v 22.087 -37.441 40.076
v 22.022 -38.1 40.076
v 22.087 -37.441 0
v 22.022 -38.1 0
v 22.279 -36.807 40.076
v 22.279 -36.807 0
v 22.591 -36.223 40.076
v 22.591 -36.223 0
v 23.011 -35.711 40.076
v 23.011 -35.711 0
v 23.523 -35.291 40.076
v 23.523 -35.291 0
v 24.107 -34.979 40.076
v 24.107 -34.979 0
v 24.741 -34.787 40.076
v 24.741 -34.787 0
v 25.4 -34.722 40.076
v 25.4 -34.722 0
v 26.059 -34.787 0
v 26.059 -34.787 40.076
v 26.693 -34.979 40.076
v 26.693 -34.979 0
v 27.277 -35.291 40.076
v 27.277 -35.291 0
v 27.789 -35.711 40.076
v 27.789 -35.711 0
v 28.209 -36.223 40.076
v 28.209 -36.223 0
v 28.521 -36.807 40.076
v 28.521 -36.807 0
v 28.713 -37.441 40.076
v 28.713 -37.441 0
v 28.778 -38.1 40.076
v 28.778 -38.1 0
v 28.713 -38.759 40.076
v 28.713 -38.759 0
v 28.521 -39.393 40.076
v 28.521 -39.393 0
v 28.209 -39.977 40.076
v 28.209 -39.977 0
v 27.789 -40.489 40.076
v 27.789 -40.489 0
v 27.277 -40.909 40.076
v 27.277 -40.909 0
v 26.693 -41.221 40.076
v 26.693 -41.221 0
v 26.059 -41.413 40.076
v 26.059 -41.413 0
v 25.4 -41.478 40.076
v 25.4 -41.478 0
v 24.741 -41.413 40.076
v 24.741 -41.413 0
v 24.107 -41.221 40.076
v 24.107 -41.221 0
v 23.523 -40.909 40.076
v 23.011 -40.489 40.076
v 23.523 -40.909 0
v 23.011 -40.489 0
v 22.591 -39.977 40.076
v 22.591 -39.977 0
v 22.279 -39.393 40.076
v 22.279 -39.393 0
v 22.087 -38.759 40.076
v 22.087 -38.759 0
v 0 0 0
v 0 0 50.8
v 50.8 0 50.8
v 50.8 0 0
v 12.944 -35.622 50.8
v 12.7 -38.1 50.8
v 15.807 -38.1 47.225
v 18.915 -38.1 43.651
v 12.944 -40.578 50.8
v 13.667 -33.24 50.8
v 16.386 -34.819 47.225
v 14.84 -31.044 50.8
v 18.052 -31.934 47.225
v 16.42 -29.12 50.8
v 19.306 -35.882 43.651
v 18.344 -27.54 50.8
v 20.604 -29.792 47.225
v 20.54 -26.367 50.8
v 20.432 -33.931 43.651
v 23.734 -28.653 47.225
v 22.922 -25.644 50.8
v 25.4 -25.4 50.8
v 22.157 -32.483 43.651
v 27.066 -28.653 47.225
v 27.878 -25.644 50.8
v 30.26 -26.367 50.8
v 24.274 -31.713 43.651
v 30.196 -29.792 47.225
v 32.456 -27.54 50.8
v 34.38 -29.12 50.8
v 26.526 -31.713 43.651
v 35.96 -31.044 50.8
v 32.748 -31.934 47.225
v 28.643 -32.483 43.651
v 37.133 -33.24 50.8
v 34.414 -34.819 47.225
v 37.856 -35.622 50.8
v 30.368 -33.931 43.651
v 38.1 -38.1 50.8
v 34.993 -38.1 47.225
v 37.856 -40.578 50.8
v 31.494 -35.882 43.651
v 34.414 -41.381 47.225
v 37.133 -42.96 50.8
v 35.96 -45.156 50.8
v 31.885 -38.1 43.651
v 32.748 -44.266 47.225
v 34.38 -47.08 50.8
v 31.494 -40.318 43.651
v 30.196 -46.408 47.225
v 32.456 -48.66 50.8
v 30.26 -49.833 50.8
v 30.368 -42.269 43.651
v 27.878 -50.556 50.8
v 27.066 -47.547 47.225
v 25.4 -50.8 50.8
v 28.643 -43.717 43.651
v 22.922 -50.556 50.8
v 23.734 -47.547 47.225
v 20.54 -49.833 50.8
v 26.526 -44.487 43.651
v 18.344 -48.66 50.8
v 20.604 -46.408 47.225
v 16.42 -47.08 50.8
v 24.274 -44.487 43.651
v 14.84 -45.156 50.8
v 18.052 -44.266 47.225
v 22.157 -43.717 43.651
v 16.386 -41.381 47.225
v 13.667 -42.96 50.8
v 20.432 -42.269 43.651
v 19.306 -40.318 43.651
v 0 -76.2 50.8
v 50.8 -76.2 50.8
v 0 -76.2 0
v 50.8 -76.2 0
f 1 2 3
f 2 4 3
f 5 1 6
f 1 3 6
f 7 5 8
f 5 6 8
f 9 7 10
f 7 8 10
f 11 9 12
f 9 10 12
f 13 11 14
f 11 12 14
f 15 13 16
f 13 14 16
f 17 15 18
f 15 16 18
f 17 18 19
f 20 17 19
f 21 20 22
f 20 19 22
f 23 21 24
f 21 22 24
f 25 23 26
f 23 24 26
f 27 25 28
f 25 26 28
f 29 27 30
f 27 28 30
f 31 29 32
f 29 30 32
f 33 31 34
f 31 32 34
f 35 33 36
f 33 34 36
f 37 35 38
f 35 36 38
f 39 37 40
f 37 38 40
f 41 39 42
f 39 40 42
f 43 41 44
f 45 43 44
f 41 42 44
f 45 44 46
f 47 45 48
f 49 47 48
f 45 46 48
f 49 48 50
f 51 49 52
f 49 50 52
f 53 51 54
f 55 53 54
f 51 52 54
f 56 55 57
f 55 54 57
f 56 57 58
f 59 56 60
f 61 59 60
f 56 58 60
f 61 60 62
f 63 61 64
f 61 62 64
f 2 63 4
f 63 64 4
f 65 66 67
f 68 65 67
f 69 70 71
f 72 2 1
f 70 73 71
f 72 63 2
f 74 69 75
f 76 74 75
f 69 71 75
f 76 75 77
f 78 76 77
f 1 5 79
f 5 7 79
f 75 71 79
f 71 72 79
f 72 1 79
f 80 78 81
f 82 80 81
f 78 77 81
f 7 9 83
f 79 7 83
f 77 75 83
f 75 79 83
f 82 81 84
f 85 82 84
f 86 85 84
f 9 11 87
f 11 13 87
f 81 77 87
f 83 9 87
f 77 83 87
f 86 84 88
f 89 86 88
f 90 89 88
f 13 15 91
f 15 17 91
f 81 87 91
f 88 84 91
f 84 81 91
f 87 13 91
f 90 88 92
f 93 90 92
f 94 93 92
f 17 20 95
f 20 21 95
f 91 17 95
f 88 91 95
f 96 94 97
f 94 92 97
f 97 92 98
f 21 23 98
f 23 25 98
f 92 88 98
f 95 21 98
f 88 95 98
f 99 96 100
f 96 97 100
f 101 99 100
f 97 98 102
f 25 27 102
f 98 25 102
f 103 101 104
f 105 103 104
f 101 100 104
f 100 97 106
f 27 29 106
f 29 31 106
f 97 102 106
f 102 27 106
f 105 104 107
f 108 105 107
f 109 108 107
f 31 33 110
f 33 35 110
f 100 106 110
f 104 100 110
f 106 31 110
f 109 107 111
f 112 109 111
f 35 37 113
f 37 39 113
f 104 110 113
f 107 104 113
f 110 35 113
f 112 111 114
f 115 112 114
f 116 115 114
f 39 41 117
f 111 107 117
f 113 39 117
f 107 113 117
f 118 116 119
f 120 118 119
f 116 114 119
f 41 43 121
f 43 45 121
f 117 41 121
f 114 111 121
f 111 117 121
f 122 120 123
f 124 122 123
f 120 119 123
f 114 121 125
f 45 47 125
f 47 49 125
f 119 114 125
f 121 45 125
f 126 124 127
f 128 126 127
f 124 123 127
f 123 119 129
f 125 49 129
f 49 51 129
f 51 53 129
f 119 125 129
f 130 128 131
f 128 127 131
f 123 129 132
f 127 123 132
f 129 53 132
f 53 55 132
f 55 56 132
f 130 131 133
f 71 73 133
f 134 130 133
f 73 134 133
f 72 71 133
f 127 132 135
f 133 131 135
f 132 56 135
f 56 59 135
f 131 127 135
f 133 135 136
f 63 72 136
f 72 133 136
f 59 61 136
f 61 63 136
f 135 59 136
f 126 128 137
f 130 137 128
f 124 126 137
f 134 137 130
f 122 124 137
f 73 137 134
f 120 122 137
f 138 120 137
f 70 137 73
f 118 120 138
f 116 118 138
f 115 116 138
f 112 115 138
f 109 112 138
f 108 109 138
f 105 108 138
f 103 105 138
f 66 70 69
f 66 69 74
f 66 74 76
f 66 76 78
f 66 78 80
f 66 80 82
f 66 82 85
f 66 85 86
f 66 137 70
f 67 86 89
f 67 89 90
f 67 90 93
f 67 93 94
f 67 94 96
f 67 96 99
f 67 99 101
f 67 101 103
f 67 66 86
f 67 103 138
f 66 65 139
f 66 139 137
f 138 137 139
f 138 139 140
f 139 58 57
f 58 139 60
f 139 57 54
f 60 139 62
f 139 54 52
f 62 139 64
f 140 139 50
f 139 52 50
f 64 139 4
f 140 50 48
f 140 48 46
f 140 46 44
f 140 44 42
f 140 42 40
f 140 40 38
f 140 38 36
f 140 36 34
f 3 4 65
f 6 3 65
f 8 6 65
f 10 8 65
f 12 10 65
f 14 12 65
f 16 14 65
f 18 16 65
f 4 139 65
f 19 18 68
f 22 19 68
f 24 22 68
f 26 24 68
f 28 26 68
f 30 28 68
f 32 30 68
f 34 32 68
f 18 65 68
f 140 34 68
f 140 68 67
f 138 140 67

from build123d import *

# Parameters (mm, degrees)
F0_W           = 50.8
F0_H           = 50.8
F1_DEPTH       = 76.2
F3_D           = 6.7564
F3_CSINK_D     = 25.4
F3_CSINK_ANGLE = 82


with BuildPart() as f1:
    # F0 (on Front) → F1 (new body)
    with BuildSketch(Plane.XZ):
        with Locations((25.4, 25.4)):
            Rectangle(F0_W, F0_H)
    extrude(amount=F1_DEPTH)

    # F3 (through all)
    with Locations(Plane.XY.offset(50.8)):
        with Locations((25.4, -38.1)):
            CounterSinkHole(F3_D / 2, F3_CSINK_D / 2, counter_sink_angle=F3_CSINK_ANGLE)


solid = f1.part
